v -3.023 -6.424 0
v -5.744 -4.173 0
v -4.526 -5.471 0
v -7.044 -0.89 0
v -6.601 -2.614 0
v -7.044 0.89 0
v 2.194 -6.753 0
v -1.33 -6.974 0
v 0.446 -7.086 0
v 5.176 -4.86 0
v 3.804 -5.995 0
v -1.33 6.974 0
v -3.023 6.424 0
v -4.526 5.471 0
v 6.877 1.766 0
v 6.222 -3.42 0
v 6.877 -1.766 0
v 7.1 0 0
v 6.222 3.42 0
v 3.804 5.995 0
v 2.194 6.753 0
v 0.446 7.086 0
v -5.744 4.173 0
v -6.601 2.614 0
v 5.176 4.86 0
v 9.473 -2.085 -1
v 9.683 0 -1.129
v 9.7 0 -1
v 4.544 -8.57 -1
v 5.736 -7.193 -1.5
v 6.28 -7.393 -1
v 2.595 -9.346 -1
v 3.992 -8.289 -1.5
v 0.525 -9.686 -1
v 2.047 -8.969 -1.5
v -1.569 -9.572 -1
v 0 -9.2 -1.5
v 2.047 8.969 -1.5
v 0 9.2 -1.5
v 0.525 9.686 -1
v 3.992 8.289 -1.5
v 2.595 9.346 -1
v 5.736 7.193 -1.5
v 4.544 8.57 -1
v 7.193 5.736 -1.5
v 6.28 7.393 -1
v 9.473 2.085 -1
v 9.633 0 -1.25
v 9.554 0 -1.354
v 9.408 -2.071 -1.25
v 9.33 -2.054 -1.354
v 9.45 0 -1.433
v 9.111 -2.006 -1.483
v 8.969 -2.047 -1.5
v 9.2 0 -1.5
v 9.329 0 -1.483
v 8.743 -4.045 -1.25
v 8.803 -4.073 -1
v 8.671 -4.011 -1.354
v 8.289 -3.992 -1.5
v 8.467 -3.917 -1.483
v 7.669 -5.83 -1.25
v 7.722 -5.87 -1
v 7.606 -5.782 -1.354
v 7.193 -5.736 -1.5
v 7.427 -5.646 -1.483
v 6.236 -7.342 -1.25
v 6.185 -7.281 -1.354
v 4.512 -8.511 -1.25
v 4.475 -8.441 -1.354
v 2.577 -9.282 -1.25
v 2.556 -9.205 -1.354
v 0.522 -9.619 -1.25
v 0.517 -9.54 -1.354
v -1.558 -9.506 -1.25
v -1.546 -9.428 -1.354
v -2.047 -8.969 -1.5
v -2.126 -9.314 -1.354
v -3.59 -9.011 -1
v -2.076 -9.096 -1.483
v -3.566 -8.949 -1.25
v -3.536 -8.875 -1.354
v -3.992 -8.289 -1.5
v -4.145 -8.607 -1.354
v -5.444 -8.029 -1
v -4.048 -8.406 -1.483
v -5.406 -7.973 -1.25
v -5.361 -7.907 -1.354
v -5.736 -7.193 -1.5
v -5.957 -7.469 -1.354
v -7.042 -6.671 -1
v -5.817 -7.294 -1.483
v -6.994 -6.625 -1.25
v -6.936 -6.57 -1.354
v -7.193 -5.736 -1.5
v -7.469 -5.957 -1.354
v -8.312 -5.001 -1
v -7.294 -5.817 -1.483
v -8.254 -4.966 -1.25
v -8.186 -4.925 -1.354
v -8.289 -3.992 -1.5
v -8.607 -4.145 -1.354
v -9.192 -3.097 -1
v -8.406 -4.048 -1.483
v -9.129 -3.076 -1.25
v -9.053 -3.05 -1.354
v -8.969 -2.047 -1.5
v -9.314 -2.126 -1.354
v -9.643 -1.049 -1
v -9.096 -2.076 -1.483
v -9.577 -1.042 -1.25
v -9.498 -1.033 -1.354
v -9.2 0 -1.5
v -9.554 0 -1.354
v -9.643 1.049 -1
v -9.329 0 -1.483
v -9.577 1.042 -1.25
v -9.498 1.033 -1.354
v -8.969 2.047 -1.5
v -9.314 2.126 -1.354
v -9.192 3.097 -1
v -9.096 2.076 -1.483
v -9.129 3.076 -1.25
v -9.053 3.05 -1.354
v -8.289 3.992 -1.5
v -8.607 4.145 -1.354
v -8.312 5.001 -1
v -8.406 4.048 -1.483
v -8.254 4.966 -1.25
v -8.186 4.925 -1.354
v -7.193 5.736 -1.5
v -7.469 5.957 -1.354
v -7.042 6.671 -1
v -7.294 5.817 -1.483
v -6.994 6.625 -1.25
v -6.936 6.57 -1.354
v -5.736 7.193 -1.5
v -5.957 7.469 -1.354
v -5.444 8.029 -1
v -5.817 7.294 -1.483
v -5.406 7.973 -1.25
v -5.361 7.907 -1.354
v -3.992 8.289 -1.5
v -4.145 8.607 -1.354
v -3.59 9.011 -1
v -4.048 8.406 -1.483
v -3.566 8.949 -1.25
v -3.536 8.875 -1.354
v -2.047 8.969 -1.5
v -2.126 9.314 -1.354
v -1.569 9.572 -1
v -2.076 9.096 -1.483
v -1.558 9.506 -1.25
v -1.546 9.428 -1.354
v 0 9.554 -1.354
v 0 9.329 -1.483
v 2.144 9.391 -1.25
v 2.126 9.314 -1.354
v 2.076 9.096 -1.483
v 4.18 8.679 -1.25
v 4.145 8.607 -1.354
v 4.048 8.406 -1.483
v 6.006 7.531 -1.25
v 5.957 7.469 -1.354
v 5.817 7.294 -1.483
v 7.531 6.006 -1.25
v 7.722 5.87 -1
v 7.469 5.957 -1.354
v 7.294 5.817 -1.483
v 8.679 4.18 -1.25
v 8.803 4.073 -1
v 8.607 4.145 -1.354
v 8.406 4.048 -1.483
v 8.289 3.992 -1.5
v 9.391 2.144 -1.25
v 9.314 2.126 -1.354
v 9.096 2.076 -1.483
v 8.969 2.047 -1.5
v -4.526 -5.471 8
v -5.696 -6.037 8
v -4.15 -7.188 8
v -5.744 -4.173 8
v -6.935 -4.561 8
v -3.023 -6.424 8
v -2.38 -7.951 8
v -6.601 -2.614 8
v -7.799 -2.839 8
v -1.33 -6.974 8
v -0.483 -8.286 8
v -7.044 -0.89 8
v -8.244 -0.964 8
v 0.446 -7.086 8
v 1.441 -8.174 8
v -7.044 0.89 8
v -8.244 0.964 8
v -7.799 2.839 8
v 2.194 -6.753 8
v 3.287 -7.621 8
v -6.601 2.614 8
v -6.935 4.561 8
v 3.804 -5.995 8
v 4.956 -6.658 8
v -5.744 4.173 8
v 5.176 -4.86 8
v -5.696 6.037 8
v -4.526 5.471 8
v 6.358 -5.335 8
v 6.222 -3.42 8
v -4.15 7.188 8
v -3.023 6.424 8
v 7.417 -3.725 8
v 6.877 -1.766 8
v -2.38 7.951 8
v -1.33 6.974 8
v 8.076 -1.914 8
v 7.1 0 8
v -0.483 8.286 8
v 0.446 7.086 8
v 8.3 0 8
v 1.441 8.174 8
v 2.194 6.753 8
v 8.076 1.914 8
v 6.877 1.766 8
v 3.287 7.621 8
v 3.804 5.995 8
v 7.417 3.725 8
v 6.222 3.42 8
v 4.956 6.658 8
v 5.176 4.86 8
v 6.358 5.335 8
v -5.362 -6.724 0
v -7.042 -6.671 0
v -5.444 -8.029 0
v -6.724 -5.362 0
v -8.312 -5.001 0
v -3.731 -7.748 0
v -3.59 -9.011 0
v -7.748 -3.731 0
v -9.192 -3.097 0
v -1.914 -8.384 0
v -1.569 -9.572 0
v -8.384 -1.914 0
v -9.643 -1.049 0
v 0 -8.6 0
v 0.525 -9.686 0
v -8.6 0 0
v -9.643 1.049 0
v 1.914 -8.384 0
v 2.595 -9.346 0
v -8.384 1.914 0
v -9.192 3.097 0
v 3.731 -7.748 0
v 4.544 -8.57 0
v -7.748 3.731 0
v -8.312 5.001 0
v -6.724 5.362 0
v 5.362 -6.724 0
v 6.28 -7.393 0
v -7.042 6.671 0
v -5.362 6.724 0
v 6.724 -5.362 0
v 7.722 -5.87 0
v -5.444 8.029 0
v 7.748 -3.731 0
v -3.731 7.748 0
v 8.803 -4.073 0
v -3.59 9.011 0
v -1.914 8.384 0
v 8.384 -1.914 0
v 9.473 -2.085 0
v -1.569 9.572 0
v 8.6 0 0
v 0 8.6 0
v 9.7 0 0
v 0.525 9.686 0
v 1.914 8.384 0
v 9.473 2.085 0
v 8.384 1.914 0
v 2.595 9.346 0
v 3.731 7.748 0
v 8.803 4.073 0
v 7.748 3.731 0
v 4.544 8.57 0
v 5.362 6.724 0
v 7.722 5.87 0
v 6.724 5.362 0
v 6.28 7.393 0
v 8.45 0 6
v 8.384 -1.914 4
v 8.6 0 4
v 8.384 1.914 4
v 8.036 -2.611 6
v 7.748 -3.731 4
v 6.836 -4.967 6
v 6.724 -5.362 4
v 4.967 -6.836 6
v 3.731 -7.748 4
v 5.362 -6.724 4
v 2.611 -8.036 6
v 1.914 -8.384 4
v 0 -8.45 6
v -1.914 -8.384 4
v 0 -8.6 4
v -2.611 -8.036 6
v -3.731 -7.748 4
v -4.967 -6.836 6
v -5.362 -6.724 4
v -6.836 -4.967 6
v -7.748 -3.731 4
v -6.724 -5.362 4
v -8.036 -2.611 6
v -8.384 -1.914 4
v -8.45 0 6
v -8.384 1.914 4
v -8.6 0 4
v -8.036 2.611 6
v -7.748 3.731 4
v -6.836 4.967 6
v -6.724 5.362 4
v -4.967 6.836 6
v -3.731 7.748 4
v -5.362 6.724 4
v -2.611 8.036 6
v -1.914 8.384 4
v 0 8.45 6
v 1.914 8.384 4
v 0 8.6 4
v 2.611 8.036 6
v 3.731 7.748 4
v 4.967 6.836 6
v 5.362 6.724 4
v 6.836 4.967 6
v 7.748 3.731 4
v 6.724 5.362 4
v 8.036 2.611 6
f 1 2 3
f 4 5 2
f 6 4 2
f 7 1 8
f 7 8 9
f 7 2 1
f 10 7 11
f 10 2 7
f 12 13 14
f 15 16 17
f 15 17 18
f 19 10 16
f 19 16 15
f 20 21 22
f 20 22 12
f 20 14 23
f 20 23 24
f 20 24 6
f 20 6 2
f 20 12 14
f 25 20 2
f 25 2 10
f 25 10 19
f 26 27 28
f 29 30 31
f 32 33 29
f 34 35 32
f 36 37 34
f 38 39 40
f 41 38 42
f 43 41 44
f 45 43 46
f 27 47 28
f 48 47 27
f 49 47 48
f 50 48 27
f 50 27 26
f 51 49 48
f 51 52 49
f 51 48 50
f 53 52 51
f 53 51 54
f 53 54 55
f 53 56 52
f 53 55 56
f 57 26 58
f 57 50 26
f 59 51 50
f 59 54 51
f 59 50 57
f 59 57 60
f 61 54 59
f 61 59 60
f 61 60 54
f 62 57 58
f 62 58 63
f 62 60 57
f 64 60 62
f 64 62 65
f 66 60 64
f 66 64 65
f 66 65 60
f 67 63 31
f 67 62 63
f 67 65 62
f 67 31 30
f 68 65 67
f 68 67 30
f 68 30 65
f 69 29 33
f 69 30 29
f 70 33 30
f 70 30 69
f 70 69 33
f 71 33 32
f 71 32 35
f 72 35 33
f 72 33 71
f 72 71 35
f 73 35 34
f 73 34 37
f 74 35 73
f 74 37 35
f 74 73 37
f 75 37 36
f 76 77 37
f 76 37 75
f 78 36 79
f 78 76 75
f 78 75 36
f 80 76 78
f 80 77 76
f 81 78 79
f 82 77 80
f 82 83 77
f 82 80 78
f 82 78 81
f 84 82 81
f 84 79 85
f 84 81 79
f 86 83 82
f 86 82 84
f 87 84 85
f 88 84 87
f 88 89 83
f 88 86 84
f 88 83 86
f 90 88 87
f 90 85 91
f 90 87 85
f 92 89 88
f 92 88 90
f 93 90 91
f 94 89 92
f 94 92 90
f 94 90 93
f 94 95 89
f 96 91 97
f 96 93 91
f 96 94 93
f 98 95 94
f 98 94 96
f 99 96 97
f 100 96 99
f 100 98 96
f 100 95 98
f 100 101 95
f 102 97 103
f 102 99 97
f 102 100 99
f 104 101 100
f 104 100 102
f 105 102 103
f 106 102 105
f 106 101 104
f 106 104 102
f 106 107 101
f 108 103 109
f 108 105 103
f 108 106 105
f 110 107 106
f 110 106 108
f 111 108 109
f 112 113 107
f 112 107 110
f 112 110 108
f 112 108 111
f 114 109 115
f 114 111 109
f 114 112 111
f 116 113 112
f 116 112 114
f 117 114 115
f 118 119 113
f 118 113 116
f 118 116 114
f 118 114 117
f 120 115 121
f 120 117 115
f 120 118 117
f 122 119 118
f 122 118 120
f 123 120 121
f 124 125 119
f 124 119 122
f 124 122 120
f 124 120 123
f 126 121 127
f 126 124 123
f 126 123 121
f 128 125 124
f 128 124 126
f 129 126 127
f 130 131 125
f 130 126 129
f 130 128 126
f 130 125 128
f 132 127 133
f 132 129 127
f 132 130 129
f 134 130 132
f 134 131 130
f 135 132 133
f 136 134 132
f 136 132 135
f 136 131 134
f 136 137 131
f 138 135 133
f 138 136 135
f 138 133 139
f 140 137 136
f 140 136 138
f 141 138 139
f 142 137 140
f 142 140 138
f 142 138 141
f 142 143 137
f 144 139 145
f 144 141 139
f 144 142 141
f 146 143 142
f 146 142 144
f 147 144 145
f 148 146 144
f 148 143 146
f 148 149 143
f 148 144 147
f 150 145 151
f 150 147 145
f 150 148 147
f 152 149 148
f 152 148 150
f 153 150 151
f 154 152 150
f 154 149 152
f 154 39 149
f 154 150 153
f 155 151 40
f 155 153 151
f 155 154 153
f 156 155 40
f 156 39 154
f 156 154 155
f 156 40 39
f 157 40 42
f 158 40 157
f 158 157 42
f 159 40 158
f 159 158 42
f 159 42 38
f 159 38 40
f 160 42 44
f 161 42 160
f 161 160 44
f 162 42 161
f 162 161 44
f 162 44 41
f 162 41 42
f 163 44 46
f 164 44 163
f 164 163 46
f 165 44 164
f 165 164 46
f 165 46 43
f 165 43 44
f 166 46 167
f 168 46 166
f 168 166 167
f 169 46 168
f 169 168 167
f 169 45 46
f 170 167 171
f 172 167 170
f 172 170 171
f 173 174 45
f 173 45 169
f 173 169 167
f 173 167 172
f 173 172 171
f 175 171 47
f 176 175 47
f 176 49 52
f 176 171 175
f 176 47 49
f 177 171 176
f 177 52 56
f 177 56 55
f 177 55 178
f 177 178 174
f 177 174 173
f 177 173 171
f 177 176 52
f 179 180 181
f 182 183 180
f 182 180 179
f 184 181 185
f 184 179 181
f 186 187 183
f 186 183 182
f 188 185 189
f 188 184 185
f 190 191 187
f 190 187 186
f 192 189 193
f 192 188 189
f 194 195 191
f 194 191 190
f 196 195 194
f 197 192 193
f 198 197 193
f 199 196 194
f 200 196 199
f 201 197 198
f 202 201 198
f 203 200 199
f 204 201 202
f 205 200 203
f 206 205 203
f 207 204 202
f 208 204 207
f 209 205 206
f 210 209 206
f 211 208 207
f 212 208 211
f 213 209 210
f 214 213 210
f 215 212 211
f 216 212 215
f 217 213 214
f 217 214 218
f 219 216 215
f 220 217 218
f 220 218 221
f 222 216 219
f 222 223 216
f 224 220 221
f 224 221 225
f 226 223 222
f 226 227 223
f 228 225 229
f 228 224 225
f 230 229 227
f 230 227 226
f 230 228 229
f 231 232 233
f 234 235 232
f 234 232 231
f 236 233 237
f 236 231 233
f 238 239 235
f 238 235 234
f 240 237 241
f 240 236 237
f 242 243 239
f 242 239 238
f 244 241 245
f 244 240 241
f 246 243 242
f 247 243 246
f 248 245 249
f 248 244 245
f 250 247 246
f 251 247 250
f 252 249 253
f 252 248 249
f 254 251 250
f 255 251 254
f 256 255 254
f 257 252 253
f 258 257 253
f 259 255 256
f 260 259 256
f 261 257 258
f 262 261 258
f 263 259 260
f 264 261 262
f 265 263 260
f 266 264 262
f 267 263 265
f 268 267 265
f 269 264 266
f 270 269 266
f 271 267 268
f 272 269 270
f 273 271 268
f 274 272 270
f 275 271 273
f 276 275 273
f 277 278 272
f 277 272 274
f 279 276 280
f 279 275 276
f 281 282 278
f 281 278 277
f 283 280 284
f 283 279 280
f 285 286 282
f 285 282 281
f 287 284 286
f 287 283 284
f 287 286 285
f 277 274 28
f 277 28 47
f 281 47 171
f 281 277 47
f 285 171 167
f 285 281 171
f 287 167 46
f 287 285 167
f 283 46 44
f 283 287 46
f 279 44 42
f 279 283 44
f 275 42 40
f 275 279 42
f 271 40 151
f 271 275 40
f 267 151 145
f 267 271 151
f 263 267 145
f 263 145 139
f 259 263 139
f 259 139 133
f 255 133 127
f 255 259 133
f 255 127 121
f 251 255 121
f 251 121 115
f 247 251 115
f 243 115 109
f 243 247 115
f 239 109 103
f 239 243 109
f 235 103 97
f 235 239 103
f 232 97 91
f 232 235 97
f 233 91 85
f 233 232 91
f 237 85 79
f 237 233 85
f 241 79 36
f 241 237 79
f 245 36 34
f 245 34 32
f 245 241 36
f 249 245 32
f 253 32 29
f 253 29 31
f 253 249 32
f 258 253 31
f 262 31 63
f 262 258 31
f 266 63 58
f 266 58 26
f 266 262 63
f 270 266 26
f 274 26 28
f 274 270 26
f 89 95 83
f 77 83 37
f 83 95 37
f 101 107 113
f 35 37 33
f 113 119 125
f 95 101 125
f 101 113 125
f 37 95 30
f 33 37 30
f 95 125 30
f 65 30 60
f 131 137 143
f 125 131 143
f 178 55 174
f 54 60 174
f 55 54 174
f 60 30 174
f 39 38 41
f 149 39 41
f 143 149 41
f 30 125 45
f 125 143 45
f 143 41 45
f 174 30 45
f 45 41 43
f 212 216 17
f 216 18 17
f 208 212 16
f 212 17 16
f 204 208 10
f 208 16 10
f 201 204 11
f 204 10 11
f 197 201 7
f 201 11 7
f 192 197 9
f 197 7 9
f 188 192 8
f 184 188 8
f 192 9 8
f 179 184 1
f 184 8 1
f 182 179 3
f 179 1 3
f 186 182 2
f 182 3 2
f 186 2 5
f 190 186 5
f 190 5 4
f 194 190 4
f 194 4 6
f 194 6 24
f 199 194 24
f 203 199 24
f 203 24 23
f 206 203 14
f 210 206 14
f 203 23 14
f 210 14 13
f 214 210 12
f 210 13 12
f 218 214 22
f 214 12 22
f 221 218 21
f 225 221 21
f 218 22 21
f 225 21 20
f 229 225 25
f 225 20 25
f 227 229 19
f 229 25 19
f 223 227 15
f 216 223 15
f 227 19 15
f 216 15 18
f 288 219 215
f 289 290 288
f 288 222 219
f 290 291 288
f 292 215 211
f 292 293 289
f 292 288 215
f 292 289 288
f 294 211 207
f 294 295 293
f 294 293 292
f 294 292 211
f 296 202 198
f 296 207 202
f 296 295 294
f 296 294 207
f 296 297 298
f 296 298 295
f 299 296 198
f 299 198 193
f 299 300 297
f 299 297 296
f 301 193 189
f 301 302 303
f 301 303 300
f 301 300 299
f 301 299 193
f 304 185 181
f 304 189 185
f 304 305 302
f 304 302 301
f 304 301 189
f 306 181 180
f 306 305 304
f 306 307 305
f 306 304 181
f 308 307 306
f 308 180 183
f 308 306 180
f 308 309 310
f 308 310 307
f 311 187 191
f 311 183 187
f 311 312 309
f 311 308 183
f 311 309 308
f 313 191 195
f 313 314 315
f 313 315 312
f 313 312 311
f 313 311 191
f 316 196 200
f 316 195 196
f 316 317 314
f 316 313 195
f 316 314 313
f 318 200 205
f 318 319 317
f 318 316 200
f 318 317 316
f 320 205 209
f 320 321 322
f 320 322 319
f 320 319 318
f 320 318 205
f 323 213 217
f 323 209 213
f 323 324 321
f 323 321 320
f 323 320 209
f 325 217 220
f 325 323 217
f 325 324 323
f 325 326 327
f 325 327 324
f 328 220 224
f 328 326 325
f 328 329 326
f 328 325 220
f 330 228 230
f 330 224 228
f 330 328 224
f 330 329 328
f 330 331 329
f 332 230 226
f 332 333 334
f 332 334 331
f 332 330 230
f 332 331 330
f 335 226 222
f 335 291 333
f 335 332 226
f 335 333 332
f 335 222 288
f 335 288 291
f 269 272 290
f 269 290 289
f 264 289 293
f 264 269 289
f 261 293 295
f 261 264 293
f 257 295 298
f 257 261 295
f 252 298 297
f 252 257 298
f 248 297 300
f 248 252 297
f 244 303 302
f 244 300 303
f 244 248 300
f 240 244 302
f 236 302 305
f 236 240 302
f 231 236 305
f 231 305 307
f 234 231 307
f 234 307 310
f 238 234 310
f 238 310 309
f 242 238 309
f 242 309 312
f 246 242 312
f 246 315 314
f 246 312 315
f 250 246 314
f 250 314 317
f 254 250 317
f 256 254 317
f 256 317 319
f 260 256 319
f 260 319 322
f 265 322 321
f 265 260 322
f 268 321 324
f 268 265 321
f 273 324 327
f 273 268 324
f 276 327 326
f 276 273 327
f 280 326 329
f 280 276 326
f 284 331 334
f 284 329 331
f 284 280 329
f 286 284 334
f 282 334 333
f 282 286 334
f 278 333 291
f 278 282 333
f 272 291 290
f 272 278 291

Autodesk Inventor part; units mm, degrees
ref_plane "YZ Plane" through (0, 0, 0) normal (1, 0, 0) x (0, 1, 0)
ref_plane "XZ Plane" through (0, 0, 0) normal (0, 1, 0) x (-1, 0, 0)
ref_plane "XY Plane" through (0, 0, 0) normal (0, 0, 1) x (1, 0, 0)
sketch "Sketch1" plane through (0, 0, 0) normal (0, 0, 1) x (1, 0, 0)
  circle A0 centre (0, 0) radius 9.7
  circle A1 centre (0, 0) radius 8.6
  circle A2 centre (0, 0) radius 7.1
  dimension "d0" = 19.4
  dimension "d1" = 17.2
  dimension "d6" = 14.2
extrude "Extrusion1" add sketch "Sketch1" along normal blind 8 contours A1 | A2
extrude "Extrusion2" add sketch "Sketch1" against normal blind 1.5 contours A0 | A1 | A2
extrude "Extrusion3" cut sketch "Sketch1" along normal up to next contours A2
fillet "Fillet1" radius 0.5 1 edges at (-9.7, 0, -1.5)
chamfer "Chamfer1" distance 0.3 distance2 4 1 edges at (-8.6, 0, 8) measured on face at (7.9479, -1.2524, 8)
properties part number "Rodend19mil"
